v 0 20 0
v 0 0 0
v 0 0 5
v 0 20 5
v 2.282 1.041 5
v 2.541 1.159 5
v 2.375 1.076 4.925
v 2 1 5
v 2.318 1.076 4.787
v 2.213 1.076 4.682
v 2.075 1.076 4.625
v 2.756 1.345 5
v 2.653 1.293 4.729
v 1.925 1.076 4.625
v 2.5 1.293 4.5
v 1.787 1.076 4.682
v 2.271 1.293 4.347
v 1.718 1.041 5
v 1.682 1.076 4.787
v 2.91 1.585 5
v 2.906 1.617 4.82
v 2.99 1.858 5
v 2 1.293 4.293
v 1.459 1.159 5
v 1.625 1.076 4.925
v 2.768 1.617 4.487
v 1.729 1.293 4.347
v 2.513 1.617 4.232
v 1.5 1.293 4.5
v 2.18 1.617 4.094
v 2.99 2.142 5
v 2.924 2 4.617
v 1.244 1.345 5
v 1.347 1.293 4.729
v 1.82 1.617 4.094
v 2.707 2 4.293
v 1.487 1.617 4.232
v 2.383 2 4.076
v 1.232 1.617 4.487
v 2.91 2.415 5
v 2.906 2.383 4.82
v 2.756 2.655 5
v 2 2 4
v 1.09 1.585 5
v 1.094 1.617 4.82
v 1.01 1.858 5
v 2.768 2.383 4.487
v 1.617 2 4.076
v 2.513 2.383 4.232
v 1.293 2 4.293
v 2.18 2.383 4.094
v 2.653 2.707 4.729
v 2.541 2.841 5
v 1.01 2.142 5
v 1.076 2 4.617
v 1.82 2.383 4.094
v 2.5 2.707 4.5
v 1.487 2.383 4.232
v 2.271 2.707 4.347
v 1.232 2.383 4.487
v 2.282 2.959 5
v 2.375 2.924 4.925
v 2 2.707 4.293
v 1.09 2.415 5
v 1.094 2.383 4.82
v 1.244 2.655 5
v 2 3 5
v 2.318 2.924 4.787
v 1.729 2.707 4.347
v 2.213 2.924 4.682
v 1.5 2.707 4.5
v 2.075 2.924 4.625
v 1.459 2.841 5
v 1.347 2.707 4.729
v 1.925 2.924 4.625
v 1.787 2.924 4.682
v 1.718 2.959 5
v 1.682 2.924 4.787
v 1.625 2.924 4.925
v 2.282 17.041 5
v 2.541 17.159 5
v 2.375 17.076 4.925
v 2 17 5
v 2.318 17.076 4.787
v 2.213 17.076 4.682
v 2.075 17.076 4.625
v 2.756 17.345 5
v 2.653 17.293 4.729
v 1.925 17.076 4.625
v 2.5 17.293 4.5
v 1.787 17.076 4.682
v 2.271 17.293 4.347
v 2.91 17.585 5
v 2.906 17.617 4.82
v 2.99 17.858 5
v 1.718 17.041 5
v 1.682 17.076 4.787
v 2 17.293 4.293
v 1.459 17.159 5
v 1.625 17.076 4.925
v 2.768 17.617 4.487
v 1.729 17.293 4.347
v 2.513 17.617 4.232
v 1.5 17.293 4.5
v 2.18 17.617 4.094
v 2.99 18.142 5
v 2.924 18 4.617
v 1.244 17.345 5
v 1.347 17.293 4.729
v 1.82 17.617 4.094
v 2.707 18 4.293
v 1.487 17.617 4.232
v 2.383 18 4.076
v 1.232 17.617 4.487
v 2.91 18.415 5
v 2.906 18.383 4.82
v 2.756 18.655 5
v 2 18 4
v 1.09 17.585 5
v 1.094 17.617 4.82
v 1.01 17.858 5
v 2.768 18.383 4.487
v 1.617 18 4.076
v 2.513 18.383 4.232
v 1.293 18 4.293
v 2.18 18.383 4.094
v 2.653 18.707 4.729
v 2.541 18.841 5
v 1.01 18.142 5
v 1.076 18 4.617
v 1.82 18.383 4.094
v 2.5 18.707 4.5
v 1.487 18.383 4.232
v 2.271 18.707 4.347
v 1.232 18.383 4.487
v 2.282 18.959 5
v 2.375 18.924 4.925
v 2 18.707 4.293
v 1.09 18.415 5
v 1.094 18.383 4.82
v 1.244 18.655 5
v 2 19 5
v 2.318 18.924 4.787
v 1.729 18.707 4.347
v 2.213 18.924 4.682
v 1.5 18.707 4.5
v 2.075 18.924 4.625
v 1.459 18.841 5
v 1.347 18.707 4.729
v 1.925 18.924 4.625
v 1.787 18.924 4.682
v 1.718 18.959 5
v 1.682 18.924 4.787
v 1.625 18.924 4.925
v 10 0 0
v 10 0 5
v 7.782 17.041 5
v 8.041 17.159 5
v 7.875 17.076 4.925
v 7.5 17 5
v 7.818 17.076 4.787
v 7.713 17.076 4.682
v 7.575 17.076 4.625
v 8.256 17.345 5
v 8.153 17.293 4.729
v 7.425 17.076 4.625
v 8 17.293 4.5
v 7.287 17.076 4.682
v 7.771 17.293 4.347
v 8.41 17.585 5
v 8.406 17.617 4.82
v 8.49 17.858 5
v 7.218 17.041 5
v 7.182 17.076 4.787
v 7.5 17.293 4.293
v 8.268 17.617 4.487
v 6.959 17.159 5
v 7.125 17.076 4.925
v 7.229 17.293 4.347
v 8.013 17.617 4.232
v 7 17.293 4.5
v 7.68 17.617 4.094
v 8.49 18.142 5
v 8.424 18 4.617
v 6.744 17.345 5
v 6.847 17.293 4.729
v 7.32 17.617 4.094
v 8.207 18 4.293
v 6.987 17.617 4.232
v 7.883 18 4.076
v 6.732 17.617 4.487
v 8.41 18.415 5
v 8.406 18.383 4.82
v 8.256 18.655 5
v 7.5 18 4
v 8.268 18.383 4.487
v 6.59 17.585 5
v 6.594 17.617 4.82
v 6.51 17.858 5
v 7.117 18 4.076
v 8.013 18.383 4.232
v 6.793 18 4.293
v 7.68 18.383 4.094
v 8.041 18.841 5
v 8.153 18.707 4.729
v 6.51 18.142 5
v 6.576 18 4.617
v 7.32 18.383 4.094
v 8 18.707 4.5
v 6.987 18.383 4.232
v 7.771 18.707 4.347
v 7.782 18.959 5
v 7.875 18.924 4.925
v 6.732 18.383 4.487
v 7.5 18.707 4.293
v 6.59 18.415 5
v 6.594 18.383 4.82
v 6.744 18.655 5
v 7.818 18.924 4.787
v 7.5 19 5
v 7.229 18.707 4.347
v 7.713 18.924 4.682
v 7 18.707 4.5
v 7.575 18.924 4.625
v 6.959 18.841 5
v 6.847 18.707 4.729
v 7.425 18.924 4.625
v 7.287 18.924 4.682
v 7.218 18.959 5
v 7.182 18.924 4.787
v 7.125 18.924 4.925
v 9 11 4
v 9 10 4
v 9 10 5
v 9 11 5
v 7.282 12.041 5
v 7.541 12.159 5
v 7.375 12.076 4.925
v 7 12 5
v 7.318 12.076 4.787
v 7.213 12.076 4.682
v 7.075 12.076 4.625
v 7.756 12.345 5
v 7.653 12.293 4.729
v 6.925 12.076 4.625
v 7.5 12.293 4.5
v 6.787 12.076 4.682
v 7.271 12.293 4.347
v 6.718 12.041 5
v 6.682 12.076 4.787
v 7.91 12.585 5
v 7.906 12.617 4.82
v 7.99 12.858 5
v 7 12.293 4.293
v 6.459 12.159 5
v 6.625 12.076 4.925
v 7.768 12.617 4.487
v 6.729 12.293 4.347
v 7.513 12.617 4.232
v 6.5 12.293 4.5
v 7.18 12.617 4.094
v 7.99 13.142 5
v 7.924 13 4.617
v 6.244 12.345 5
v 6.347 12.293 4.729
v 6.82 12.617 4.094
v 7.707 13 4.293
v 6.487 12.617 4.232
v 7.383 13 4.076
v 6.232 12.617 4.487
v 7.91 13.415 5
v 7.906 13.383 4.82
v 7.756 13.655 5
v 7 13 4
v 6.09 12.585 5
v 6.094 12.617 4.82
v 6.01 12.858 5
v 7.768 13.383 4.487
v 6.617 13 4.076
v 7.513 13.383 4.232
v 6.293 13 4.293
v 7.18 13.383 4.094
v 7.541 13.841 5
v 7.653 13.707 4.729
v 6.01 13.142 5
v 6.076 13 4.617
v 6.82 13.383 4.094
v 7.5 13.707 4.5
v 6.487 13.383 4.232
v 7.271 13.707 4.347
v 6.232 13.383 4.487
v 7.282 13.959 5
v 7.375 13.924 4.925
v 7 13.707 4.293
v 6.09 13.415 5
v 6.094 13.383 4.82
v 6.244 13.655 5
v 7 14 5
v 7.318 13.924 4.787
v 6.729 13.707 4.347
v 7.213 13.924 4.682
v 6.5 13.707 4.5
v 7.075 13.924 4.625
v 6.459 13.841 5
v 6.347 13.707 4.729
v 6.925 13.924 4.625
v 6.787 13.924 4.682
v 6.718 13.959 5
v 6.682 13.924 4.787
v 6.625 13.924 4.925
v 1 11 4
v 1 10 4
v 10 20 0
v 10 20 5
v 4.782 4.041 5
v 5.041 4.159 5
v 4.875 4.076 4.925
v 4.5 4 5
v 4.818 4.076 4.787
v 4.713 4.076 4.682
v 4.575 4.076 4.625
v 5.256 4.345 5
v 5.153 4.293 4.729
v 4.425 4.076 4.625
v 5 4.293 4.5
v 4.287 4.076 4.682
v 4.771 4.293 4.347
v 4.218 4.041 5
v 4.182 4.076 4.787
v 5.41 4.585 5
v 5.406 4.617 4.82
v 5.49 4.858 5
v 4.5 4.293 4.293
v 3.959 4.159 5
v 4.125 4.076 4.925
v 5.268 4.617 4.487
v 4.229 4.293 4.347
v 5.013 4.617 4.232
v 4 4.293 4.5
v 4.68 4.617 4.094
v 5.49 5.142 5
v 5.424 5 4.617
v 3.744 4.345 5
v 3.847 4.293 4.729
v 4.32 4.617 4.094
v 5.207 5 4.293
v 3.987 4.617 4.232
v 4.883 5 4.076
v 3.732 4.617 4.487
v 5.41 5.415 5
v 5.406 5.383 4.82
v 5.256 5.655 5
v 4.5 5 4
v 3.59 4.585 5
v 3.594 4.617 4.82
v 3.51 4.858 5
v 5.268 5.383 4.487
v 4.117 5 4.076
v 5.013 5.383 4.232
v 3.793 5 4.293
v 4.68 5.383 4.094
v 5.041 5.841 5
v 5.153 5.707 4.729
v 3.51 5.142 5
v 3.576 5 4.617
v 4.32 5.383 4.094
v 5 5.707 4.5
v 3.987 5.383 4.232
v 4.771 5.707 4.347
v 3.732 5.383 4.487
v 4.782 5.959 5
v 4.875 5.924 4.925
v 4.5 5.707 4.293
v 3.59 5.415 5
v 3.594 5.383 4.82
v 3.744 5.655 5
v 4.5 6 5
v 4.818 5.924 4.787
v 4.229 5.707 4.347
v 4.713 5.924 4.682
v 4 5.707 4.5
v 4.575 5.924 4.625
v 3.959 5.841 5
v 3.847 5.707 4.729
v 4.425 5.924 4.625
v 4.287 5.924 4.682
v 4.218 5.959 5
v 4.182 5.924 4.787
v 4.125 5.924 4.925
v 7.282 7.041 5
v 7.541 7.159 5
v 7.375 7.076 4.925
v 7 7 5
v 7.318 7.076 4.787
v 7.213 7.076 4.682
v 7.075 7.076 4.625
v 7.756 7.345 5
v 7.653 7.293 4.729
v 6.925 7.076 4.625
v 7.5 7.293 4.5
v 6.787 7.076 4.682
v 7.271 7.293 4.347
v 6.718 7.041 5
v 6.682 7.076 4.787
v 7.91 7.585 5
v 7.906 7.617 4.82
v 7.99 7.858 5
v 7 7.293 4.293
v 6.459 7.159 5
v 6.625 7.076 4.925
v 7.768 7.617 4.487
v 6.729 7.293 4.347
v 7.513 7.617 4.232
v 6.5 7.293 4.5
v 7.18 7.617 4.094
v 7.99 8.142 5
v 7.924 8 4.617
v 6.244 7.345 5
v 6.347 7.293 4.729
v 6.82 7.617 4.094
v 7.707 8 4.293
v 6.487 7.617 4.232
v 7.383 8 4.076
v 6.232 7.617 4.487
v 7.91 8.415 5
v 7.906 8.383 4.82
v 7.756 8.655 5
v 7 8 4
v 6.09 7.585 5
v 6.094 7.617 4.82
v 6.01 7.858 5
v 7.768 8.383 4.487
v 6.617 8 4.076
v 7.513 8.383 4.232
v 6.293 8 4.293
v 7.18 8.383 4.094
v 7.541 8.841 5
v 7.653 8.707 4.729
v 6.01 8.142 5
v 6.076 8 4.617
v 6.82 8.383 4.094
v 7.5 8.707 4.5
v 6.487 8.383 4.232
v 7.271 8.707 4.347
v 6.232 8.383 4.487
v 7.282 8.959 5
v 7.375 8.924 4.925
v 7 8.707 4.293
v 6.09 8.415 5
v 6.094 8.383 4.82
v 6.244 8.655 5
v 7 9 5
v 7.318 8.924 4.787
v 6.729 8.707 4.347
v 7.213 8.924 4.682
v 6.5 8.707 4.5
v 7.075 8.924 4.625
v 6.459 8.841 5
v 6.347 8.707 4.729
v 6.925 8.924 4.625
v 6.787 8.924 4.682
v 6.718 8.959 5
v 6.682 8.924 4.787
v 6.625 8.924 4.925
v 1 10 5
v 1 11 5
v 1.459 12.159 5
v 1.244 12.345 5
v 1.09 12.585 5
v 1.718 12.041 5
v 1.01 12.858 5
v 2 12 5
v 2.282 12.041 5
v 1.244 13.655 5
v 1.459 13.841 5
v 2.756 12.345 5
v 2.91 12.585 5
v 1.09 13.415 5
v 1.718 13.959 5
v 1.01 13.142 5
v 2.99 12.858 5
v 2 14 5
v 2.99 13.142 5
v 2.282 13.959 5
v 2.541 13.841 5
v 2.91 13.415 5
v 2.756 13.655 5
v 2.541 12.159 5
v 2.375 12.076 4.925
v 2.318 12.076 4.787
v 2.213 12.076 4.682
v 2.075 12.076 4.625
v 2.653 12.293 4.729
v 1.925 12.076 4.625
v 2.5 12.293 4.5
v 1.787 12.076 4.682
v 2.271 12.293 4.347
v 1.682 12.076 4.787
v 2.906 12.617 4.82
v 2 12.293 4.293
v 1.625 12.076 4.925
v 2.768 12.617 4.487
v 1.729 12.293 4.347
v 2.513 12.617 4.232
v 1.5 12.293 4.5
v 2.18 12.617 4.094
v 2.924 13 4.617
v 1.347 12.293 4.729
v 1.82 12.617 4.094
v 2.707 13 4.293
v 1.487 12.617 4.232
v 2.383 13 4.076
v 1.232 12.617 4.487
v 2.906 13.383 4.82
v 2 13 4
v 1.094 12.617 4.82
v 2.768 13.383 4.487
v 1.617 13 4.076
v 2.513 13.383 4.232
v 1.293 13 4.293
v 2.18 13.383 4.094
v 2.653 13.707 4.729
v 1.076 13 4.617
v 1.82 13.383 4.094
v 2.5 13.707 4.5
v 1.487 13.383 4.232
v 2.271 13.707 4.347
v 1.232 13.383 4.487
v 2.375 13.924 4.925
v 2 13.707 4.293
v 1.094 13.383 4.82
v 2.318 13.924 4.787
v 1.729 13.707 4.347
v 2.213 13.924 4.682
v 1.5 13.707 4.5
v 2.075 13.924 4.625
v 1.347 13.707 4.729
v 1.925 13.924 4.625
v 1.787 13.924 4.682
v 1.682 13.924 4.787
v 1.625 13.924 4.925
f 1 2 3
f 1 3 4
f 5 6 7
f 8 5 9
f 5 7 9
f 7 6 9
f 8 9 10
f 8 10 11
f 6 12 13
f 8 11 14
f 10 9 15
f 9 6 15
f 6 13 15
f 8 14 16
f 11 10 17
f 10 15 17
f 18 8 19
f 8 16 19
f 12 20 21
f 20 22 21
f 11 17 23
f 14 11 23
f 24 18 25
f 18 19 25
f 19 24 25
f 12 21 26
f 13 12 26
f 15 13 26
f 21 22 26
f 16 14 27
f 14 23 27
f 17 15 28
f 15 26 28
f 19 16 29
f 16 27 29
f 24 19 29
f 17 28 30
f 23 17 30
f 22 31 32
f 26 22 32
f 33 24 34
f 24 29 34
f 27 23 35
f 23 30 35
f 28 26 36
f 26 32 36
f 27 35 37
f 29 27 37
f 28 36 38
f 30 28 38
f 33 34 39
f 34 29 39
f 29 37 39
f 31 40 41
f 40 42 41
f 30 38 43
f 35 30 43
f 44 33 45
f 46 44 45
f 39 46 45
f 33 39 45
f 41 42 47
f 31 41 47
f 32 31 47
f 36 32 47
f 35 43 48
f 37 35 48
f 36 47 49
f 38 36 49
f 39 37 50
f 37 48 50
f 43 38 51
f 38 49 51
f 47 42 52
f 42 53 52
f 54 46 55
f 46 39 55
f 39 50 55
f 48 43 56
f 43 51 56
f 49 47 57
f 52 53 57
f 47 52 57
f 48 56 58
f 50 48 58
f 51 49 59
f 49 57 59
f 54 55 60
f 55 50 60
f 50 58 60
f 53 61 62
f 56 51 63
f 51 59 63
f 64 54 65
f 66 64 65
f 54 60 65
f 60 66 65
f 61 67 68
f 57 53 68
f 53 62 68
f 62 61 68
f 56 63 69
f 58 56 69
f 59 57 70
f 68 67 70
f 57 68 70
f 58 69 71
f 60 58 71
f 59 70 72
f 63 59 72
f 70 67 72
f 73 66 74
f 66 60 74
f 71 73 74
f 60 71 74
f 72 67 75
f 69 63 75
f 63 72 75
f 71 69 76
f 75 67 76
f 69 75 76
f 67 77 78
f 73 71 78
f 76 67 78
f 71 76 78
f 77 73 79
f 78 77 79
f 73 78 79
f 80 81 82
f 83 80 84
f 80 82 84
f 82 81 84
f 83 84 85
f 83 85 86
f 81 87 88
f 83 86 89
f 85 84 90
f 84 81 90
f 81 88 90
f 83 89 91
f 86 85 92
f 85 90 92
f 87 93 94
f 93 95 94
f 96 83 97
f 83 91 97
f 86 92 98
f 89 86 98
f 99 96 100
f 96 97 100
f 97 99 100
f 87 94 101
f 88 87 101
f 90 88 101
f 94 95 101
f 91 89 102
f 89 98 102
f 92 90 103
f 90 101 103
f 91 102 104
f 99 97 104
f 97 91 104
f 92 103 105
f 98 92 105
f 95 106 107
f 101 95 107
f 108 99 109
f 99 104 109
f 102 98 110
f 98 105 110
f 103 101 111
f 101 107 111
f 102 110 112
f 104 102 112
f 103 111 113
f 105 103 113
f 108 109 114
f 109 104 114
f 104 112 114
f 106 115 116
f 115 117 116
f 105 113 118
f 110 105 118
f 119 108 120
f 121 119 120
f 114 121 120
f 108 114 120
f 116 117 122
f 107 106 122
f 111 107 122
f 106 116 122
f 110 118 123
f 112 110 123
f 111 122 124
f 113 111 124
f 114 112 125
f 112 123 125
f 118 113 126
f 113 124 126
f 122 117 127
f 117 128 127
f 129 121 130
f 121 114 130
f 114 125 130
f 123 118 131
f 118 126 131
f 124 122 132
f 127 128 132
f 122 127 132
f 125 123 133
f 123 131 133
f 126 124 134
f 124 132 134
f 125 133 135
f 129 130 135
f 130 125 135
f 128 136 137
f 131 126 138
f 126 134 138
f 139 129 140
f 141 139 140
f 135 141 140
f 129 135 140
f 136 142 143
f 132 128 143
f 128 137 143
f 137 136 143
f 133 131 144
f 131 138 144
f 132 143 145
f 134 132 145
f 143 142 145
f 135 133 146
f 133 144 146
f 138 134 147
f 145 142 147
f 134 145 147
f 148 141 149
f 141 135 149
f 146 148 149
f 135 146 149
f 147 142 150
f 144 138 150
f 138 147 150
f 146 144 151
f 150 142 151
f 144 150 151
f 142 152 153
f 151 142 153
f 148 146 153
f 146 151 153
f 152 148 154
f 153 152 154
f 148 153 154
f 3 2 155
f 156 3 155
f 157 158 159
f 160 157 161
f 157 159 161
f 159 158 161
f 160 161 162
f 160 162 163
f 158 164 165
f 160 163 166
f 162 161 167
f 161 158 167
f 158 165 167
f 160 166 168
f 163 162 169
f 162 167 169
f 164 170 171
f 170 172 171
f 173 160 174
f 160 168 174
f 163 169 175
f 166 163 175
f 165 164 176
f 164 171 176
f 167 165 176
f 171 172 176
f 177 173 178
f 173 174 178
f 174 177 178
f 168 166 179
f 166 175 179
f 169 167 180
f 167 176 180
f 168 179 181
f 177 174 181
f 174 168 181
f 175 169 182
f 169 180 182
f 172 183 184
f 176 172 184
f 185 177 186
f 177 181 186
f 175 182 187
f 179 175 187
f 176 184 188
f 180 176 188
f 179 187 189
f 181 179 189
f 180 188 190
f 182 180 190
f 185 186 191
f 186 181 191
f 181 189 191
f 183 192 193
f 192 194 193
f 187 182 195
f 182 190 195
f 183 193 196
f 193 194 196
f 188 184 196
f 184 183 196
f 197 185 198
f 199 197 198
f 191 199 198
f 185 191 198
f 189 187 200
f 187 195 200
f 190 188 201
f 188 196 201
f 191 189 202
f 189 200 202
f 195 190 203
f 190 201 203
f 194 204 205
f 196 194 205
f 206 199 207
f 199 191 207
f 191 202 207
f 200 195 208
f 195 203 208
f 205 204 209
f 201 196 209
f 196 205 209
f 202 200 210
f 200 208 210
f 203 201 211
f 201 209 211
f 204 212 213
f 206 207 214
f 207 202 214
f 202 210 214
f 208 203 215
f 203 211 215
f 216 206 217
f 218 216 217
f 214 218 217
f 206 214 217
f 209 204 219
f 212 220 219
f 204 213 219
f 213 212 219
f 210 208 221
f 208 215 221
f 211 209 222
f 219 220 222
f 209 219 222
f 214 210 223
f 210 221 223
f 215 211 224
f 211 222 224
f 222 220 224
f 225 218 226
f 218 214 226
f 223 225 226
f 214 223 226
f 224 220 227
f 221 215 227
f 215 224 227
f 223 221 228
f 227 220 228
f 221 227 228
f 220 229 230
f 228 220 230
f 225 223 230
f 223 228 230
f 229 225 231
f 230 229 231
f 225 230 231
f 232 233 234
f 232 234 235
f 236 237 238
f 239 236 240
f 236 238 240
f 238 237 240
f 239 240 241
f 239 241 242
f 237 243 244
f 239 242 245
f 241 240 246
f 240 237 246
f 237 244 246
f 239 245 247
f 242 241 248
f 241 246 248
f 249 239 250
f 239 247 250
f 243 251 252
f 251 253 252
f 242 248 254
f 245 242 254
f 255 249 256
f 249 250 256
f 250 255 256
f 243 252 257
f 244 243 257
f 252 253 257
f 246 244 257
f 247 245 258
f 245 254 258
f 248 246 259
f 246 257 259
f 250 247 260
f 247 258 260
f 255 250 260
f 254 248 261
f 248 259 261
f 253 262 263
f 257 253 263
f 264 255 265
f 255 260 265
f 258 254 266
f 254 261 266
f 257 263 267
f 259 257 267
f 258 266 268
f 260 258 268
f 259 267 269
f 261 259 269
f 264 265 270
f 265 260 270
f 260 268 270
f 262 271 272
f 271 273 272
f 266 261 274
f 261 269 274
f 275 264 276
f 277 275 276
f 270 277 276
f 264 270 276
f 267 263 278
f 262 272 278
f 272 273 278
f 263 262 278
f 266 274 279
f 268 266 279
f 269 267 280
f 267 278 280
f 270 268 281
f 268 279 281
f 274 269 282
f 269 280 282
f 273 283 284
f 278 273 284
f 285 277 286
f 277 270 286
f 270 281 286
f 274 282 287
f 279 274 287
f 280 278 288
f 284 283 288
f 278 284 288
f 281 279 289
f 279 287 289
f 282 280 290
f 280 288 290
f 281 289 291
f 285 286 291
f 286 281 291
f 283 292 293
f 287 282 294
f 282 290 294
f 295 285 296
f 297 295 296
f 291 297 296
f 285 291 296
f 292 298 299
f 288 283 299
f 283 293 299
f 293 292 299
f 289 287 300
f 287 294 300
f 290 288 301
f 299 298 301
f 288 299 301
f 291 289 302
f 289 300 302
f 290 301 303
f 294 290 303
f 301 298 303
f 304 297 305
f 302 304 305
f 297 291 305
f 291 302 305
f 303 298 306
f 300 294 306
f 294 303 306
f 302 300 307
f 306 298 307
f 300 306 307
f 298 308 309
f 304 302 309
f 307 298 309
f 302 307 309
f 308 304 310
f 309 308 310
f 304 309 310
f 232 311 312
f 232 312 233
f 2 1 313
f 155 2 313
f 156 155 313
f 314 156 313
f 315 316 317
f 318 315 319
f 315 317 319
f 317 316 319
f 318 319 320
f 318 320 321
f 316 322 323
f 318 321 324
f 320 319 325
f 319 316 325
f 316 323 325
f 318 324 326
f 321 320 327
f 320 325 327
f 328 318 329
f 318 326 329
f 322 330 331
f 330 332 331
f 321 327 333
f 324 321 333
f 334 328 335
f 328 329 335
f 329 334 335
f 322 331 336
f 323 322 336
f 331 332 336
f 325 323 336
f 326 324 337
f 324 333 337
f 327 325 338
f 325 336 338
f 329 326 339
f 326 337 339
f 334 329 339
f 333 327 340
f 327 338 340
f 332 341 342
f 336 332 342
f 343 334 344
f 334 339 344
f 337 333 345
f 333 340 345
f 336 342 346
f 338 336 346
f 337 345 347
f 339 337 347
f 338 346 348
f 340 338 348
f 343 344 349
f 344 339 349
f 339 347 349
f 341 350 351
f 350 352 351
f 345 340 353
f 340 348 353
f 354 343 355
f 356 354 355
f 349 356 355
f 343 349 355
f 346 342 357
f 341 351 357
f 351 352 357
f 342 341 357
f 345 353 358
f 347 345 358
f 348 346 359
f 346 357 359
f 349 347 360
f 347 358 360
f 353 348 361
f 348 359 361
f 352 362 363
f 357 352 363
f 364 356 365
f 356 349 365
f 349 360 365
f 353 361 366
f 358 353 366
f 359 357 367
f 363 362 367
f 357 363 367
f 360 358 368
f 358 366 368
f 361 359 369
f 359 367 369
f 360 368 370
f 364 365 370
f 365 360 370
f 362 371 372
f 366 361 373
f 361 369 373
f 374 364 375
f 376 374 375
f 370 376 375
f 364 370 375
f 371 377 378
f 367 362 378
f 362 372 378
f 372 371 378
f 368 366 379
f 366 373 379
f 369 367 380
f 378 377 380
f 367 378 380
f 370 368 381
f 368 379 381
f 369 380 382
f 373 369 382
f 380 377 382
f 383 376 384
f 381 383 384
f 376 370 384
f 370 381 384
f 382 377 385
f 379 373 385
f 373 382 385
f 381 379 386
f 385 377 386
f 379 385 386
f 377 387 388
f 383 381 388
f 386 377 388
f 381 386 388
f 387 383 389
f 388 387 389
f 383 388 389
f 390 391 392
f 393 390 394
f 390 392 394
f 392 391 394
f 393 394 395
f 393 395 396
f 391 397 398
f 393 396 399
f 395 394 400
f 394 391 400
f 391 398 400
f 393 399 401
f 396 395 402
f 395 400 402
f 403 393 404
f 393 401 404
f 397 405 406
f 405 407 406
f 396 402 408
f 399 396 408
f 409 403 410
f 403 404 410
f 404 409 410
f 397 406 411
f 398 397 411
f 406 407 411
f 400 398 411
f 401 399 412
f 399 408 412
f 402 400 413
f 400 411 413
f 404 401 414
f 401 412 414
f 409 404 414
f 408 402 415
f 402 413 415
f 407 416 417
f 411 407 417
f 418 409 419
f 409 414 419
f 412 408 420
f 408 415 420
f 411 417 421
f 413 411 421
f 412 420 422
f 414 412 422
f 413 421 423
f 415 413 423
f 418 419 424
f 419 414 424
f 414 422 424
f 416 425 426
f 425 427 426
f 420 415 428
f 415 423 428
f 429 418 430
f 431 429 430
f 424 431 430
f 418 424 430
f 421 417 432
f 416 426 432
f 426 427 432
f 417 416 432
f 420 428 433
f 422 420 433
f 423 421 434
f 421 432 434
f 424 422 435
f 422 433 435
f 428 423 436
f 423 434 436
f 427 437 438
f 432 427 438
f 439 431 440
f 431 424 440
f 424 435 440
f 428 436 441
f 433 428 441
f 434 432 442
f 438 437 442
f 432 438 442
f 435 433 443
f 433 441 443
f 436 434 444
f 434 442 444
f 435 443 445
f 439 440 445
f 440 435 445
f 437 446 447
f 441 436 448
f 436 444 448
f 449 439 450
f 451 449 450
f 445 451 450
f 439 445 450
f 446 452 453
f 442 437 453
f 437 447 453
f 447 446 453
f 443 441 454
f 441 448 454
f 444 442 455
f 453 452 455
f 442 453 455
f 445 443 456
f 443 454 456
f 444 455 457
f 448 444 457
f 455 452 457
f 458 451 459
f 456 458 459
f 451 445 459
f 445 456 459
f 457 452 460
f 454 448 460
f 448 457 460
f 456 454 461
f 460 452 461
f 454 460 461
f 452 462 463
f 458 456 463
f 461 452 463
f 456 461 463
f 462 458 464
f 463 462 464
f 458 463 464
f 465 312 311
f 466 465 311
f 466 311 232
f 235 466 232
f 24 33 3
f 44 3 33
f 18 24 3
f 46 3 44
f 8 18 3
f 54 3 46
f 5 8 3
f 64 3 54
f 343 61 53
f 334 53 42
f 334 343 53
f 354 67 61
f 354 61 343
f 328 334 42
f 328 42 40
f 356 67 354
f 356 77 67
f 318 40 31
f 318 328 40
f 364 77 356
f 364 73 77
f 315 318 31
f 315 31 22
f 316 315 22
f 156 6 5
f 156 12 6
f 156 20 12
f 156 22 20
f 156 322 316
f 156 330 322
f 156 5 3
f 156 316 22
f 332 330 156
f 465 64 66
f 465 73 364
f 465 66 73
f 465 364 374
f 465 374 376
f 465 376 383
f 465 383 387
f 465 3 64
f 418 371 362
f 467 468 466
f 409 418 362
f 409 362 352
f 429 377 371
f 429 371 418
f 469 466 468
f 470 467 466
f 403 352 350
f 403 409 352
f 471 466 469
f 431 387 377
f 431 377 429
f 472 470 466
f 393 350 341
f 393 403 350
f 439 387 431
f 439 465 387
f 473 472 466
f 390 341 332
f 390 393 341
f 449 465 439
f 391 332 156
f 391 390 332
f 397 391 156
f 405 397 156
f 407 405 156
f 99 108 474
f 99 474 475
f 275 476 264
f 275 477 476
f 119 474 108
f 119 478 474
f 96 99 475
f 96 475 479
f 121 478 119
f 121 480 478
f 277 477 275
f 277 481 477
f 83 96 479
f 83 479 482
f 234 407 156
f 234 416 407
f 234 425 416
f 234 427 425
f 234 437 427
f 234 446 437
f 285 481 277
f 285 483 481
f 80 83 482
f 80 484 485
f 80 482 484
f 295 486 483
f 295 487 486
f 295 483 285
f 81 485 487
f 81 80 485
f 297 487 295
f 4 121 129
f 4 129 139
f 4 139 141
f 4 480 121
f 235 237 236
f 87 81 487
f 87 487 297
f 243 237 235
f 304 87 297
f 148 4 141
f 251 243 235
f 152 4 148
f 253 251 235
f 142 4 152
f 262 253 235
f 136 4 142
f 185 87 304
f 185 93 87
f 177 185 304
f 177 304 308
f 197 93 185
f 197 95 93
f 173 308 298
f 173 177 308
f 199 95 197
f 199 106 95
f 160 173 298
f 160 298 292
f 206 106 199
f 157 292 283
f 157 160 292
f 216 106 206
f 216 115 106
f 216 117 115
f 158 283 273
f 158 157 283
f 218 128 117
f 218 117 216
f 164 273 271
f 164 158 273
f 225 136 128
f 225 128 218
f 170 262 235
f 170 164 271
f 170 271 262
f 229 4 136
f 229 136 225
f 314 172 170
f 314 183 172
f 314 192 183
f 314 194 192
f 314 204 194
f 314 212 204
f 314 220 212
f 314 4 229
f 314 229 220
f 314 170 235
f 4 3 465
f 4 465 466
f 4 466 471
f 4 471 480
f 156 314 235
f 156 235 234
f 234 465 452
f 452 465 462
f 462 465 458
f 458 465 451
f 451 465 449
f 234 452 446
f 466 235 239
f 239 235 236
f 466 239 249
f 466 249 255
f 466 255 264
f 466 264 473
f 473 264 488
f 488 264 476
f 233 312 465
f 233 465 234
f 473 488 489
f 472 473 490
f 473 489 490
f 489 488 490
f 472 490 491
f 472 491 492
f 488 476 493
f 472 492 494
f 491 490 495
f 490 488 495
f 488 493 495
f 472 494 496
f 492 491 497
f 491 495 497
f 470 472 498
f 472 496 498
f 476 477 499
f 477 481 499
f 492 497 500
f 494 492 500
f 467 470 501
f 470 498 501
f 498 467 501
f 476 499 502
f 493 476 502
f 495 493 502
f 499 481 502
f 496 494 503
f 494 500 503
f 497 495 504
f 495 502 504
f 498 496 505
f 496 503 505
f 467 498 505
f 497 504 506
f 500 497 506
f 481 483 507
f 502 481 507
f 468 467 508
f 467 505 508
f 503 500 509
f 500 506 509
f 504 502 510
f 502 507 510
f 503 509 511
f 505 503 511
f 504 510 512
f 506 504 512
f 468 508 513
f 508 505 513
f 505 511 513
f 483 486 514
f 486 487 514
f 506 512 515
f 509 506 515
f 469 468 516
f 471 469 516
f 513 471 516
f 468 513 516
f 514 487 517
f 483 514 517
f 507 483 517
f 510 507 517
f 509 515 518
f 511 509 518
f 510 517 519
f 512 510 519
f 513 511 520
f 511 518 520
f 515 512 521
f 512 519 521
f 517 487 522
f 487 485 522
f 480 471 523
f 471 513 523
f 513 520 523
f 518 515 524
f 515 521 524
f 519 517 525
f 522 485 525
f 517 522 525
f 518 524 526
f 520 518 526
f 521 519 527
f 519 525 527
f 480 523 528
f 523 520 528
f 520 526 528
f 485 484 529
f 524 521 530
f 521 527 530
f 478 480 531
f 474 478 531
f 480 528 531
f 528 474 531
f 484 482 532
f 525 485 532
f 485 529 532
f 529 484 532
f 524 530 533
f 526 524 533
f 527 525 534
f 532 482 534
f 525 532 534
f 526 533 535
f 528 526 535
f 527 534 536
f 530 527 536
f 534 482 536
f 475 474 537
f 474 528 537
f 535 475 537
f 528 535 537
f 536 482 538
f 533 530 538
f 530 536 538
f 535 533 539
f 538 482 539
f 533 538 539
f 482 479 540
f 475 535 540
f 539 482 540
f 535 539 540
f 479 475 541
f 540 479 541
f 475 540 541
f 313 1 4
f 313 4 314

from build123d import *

# Parameters (mm, degrees)
SPHERE_ANGLE    = 180
SPHERE002_ANGLE = 180
SPHERE001_ANGLE = 180
SPHERE003_ANGLE = 180
SPHERE004_ANGLE = 180
SPHERE005_ANGLE = 180
SPHERE006_ANGLE = 180
SPHERE007_ANGLE = 180
BOX001_W        = 8
BOX001_H        = 1
BOX001_DEPTH    = 1
BOX_W           = 10
BOX_H           = 20
BOX_DEPTH       = 5


with BuildPart() as esfera:
    # Sphere → Sphere (revolve)
    with BuildSketch(Plane(origin=(2, 2, 5), x_dir=(1, 0, 0), z_dir=(0, 0, 1))):
        with BuildLine():
            ThreePointArc((0, -1), (1, 0), (0, 1))
            Line((0, 1), (0, -1))
        make_face()
    revolve(axis=Axis((2, 2, 5), (0, 1, 0)), revolution_arc=SPHERE_ANGLE)


with BuildPart() as esfera002:
    # Sphere002 → Sphere002 (revolve)
    with BuildSketch(Plane(origin=(7, 8, 5), x_dir=(1, 0, 0), z_dir=(0, 0, 1))):
        with BuildLine():
            ThreePointArc((0, -1), (1, 0), (0, 1))
            Line((0, 1), (0, -1))
        make_face()
    revolve(axis=Axis((7, 8, 5), (0, 1, 0)), revolution_arc=SPHERE002_ANGLE)


with BuildPart() as esfera001:
    # Sphere001 → Sphere001 (revolve)
    with BuildSketch(Plane(origin=(4.5, 5, 5), x_dir=(1, 0, 0), z_dir=(0, 0, 1))):
        with BuildLine():
            ThreePointArc((0, -1), (1, 0), (0, 1))
            Line((0, 1), (0, -1))
        make_face()
    revolve(axis=Axis((4.5, 5, 5), (0, 1, 0)), revolution_arc=SPHERE001_ANGLE)


with BuildPart() as esfera003:
    # Sphere003 → Sphere003 (revolve)
    with BuildSketch(Plane(origin=(4.5, 5, 5), x_dir=(1, 0, 0), z_dir=(0, 0, 1))):
        with BuildLine():
            ThreePointArc((0, -1), (1, 0), (0, 1))
            Line((0, 1), (0, -1))
        make_face()
    revolve(axis=Axis((4.5, 5, 5), (0, 1, 0)), revolution_arc=SPHERE003_ANGLE)


with BuildPart() as esfera004:
    # Sphere004 → Sphere004 (revolve)
    with BuildSketch(Plane(origin=(7.5, 18, 5), x_dir=(1, 0, 0), z_dir=(0, 0, 1))):
        with BuildLine():
            ThreePointArc((0, -1), (1, 0), (0, 1))
            Line((0, 1), (0, -1))
        make_face()
    revolve(axis=Axis((7.5, 18, 5), (0, 1, 0)), revolution_arc=SPHERE004_ANGLE)


with BuildPart() as esfera005:
    # Sphere005 → Sphere005 (revolve)
    with BuildSketch(Plane(origin=(2, 18, 5), x_dir=(1, 0, 0), z_dir=(0, 0, 1))):
        with BuildLine():
            ThreePointArc((0, -1), (1, 0), (0, 1))
            Line((0, 1), (0, -1))
        make_face()
    revolve(axis=Axis((2, 18, 5), (0, 1, 0)), revolution_arc=SPHERE005_ANGLE)


with BuildPart() as esfera006:
    # Sphere006 → Sphere006 (revolve)
    with BuildSketch(Plane(origin=(2, 13, 5), x_dir=(1, 0, 0), z_dir=(0, 0, 1))):
        with BuildLine():
            ThreePointArc((0, -1), (1, 0), (0, 1))
            Line((0, 1), (0, -1))
        make_face()
    revolve(axis=Axis((2, 13, 5), (0, 1, 0)), revolution_arc=SPHERE006_ANGLE)


with BuildPart() as esfera007:
    # Sphere007 → Sphere007 (revolve)
    with BuildSketch(Plane(origin=(7, 13, 5), x_dir=(1, 0, 0), z_dir=(0, 0, 1))):
        with BuildLine():
            ThreePointArc((0, -1), (1, 0), (0, 1))
            Line((0, 1), (0, -1))
        make_face()
    revolve(axis=Axis((7, 13, 5), (0, 1, 0)), revolution_arc=SPHERE007_ANGLE)


with BuildPart() as fusion:
    # Box001 → Box001 (new body)
    with BuildSketch(Plane(origin=(1, 10, 4), x_dir=(1, 0, 0), z_dir=(0, 0, 1))):
        with Locations((4, 0.5)):
            Rectangle(BOX001_W, BOX001_H)
    extrude(amount=BOX001_DEPTH)

    # Fusion: union Esfera, Esfera002, Esfera001, Esfera003, Esfera004, Esfera005, Esfera006, Esfera007
    add(esfera.part)
    add(esfera002.part)
    add(esfera001.part)
    add(esfera003.part)
    add(esfera004.part)
    add(esfera005.part)
    add(esfera006.part)
    add(esfera007.part)


with BuildPart() as cut:
    # Box → Box (new body)
    with BuildSketch(Plane.XY):
        with Locations((5, 10)):
            Rectangle(BOX_W, BOX_H)
    extrude(amount=BOX_DEPTH)

    # Cut: cut Fusion
    add(fusion.part, mode=Mode.SUBTRACT)


solid = cut.part
